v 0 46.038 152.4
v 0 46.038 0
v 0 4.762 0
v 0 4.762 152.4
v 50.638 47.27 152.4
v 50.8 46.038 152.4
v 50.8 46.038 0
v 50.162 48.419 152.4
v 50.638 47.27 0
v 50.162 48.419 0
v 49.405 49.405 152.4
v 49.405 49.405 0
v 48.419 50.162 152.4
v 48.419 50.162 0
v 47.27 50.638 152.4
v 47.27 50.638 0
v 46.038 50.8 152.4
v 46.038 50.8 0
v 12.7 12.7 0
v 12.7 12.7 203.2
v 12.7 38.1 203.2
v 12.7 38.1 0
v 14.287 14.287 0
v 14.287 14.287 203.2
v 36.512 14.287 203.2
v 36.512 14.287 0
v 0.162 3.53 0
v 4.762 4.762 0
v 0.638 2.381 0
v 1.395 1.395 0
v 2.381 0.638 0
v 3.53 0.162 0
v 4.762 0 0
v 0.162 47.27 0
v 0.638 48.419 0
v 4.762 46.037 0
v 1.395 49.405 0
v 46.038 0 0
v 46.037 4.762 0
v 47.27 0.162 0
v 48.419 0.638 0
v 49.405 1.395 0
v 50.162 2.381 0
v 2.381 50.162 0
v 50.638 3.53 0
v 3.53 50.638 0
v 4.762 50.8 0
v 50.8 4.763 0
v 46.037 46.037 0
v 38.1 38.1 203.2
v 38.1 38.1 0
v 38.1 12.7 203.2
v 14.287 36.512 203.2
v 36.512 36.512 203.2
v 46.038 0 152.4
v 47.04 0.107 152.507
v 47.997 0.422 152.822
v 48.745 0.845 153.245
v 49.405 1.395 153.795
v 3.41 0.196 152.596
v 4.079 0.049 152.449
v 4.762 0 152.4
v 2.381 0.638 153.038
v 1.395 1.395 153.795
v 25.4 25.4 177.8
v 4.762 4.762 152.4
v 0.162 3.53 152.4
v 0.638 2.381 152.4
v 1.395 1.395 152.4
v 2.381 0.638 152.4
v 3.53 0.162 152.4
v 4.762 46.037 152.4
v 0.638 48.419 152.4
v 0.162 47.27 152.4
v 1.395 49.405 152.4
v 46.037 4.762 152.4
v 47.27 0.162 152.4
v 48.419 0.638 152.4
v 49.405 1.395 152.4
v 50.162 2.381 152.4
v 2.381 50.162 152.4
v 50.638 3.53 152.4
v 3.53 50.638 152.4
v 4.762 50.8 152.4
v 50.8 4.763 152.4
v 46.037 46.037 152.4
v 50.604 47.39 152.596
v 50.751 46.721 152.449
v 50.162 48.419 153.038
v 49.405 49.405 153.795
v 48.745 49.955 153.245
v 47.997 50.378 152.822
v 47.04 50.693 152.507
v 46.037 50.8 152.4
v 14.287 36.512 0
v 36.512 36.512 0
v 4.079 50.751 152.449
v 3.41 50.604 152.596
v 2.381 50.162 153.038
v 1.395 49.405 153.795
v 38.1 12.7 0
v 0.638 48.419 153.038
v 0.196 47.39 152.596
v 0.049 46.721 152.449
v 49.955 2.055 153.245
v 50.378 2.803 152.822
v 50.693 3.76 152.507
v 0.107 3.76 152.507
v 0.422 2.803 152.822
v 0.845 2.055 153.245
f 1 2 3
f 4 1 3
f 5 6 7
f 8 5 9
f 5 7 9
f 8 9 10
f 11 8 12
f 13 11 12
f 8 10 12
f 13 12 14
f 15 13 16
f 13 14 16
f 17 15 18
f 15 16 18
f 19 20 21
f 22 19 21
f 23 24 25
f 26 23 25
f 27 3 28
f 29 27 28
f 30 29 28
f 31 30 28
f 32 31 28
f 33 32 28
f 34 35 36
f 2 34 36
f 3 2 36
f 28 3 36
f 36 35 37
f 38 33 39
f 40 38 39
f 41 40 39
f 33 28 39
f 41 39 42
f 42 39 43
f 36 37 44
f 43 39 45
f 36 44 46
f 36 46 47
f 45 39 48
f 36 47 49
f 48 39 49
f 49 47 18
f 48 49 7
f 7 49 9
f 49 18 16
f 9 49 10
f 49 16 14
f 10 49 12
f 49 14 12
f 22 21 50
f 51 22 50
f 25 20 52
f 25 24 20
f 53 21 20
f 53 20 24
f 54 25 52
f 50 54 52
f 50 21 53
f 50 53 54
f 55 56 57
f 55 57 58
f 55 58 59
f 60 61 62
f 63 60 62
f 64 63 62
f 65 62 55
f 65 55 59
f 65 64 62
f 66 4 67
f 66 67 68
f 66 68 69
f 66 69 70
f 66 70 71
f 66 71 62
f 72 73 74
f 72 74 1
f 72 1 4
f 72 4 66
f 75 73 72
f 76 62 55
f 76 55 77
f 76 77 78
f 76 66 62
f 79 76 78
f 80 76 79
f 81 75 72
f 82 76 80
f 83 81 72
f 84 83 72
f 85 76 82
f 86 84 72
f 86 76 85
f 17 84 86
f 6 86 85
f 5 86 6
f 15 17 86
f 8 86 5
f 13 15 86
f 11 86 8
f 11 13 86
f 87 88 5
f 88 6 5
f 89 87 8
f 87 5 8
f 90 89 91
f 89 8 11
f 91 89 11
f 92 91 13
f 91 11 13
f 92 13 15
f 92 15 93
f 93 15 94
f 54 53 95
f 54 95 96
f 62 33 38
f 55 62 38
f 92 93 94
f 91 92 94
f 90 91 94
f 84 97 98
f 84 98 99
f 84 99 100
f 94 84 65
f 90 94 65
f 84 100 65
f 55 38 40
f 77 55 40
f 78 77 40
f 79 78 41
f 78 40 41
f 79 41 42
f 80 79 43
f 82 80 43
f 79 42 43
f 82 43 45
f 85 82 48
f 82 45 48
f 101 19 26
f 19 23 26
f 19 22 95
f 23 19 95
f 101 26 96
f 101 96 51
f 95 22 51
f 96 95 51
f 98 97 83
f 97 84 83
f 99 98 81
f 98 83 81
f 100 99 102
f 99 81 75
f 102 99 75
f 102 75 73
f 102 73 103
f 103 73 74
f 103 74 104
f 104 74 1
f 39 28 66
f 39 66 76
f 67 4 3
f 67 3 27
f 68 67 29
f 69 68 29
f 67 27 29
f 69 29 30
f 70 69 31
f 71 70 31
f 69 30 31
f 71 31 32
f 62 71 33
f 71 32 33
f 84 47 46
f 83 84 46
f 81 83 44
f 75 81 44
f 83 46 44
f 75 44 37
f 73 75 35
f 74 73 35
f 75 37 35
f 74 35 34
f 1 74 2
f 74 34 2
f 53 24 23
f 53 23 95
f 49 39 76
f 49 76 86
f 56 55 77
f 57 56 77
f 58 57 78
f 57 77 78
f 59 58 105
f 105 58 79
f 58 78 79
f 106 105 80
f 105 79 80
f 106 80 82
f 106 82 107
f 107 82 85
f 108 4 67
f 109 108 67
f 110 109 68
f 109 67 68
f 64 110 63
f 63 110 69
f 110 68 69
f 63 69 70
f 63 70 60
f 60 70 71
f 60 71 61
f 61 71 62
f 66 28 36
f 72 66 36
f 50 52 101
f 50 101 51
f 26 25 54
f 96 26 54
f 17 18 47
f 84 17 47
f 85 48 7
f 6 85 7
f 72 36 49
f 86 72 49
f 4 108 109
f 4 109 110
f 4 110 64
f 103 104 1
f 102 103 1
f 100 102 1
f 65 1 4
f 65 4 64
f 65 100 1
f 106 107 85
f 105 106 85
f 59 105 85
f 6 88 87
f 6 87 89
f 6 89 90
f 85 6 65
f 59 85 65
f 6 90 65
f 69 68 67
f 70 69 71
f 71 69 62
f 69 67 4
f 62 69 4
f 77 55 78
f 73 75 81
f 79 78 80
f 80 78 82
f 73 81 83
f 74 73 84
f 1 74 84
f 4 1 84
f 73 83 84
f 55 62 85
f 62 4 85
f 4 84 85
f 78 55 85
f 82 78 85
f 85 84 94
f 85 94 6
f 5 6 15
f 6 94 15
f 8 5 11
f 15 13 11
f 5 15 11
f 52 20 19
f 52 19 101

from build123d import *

# Parameters (mm, degrees)
F0_W         = 41.275
F0_H         = 41.275
F1_DEPTH     = 152.4
F3_W         = 41.275
F3_H         = 41.275
F4_DEPTH     = 25.4
F5_T1_DEPTH  = 171.9164957887
F5_T3_DEPTH  = 171.9164957887
F5_T8_ANGLE  = 90
F5_T13_ANGLE = 90
F5_T18_ANGLE = 90
F5_T23_ANGLE = 90
F5_T28_ANGLE = 90
F5_T33_ANGLE = 90
F5_T38_ANGLE = 90
F5_T43_ANGLE = 90
F2_W         = 25.4
F2_H         = 25.4
F2_W_2       = 22.225
F2_H_2       = 22.225
F6_DEPTH     = 203.2


# Not quite as in the source:
# - a fillet or chamfer that OpenCascade refuses, or shapes differently, is made with other operations: its cross-section is extruded or revolved along the edge and cut away or added


with BuildPart() as f1:
    # F0 (on Top) → F1 (new body)
    with BuildSketch(Plane.XY):
        with BuildLine():
            ThreePointArc((0, 4.7625), (1.3949039546, 1.3949039546), (4.7625, 0))
            Line((4.7625, 0), (46.0375, 0))
            ThreePointArc((46.0375, 0), (49.4050960454, 1.3949039546), (50.8, 4.7625))
            Line((50.8, 4.7625), (50.8, 46.0375))
            ThreePointArc((50.8, 46.0375), (49.4050960454, 49.4050960454), (46.0375, 50.8))
            Line((46.0375, 50.8), (4.7625, 50.8))
            ThreePointArc((4.7625, 50.8), (1.3949039546, 49.4050960454), (0, 46.0375))
            Line((0, 46.0375), (0, 4.7625))
        make_face()
        with Locations((25.4, 25.4)):
            Rectangle(F0_W, F0_H, mode=Mode.SUBTRACT)
    extrude(amount=F1_DEPTH)


with BuildPart() as f4:
    # F3 (on face) → F4 (new body)
    with BuildSketch(Plane.XY.offset(152.4)):
        with BuildLine():
            ThreePointArc((0, 4.7625), (1.3949039546, 1.3949039546), (4.7625, 0))
            Line((4.7625, 0), (46.0375, 0))
            ThreePointArc((46.0375, 0), (49.4050960454, 1.3949039546), (50.8, 4.7625))
            Line((50.8, 4.7625), (50.8, 46.0375))
            ThreePointArc((50.8, 46.0375), (49.4050960454, 49.4050960454), (46.0375, 50.8))
            Line((46.0375, 50.8), (4.7625, 50.8))
            ThreePointArc((4.7625, 50.8), (1.3949039546, 49.4050960454), (0, 46.0375))
            Line((0, 46.0375), (0, 4.7625))
        make_face()
        with Locations((25.4, 25.4)):
            Rectangle(F3_W, F3_H, mode=Mode.SUBTRACT)
        with Locations((25.4, 25.4)):
            Rectangle(F3_W, F3_H)
    extrude(amount=F4_DEPTH)

    # F5: chamfer of 25.4 on 4 edges, made by hand

    # F5_s2 → F5_t1 (cut)
    with BuildSketch(Plane.XZ.offset(-111.3582478943)):
        Polygon((50.8, 152.4), (25.4, 177.8), (50.8, 177.8), align=None)
        Polygon((0, 152.4), (25.4, 177.8), (0, 177.8), align=None)
    extrude(amount=F5_T1_DEPTH, mode=Mode.SUBTRACT)

    # F5_s4 → F5_t3 (cut)
    with BuildSketch(Plane.YZ.offset(-60.5582478943)):
        Polygon((50.8, 152.4), (25.4, 177.8), (50.8, 177.8), align=None)
        Polygon((0, 152.4), (25.4, 177.8), (0, 177.8), align=None)
    extrude(amount=F5_T3_DEPTH, mode=Mode.SUBTRACT)


with BuildPart() as f5_tool6:
    # F5_s7 → F5_t8 (revolve)
    with BuildSketch(Plane.YZ.offset(4.7625)):
        Polygon((50.8, 152.4), (46.0375, 157.1625), (46.0375, 177.8), (50.8, 177.8), align=None)
    revolve(axis=Axis((4.7625, 46.0375, 177.8), (0, 0, 1)), revolution_arc=F5_T8_ANGLE)

    split(bisect_by=Plane(origin=(0, 101.6, 101.6), x_dir=(1, 0, 0), z_dir=(0, 0.7071067812, 0.7071067812)), keep=Keep.TOP)


with BuildPart() as f4_1:
    add(f4.part)

    # F5_t5: cut F5_tool6
    add(f5_tool6.part, mode=Mode.SUBTRACT)


with BuildPart() as f5_tool11:
    # F5_s12 → F5_t13 (revolve)
    with BuildSketch(Plane.YZ.offset(4.7625)):
        Polygon((50.8, 152.4), (46.0375, 157.1625), (46.0375, 177.8), (50.8, 177.8), align=None)
    revolve(axis=Axis((4.7625, 46.0375, 177.8), (0, 0, 1)), revolution_arc=F5_T13_ANGLE)

    split(bisect_by=Plane(origin=(-76.2, 0, 76.2), x_dir=(0, 1, 0), z_dir=(-0.7071067812, 0, 0.7071067812)), keep=Keep.TOP)


with BuildPart() as f4_2:
    add(f4_1.part)

    # F5_t10: cut F5_tool11
    add(f5_tool11.part, mode=Mode.SUBTRACT)


with BuildPart() as f5_tool16:
    # F5_s17 → F5_t18 (revolve)
    with BuildSketch(Plane.XZ.offset(-4.7625)):
        Polygon((0, 152.4), (4.7625, 157.1625), (4.7625, 177.8), (0, 177.8), align=None)
    revolve(axis=Axis((4.7625, 4.7625, 177.8), (0, 0, 1)), revolution_arc=F5_T18_ANGLE)

    split(bisect_by=Plane(origin=(-76.2, 0, 76.2), x_dir=(0, 1, 0), z_dir=(-0.7071067812, 0, 0.7071067812)), keep=Keep.TOP)


with BuildPart() as f4_3:
    add(f4_2.part)

    # F5_t15: cut F5_tool16
    add(f5_tool16.part, mode=Mode.SUBTRACT)


with BuildPart() as f5_tool21:
    # F5_s22 → F5_t23 (revolve)
    with BuildSketch(Plane.XZ.offset(-4.7625)):
        Polygon((0, 152.4), (4.7625, 157.1625), (4.7625, 177.8), (0, 177.8), align=None)
    revolve(axis=Axis((4.7625, 4.7625, 177.8), (0, 0, 1)), revolution_arc=F5_T23_ANGLE)

    split(bisect_by=Plane(origin=(0, -76.2, 76.2), x_dir=(1, 0, 0), z_dir=(0, -0.7071067812, 0.7071067812)), keep=Keep.TOP)


with BuildPart() as f4_4:
    add(f4_3.part)

    # F5_t20: cut F5_tool21
    add(f5_tool21.part, mode=Mode.SUBTRACT)


with BuildPart() as f5_tool26:
    # F5_s27 → F5_t28 (revolve)
    with BuildSketch(Plane.YZ.offset(46.0375)):
        Polygon((0, 152.4), (4.7625, 157.1625), (4.7625, 177.8), (0, 177.8), align=None)
    revolve(axis=Axis((46.0375, 4.7625, 177.8), (0, 0, 1)), revolution_arc=F5_T28_ANGLE)

    split(bisect_by=Plane(origin=(0, -76.2, 76.2), x_dir=(1, 0, 0), z_dir=(0, -0.7071067812, 0.7071067812)), keep=Keep.TOP)


with BuildPart() as f4_5:
    add(f4_4.part)

    # F5_t25: cut F5_tool26
    add(f5_tool26.part, mode=Mode.SUBTRACT)


with BuildPart() as f5_tool31:
    # F5_s32 → F5_t33 (revolve)
    with BuildSketch(Plane.YZ.offset(46.0375)):
        Polygon((0, 152.4), (4.7625, 157.1625), (4.7625, 177.8), (0, 177.8), align=None)
    revolve(axis=Axis((46.0375, 4.7625, 177.8), (0, 0, 1)), revolution_arc=F5_T33_ANGLE)

    split(bisect_by=Plane(origin=(101.6, 0, 101.6), x_dir=(0, 1, 0), z_dir=(0.7071067812, 0, 0.7071067812)), keep=Keep.TOP)


with BuildPart() as f4_6:
    add(f4_5.part)

    # F5_t30: cut F5_tool31
    add(f5_tool31.part, mode=Mode.SUBTRACT)


with BuildPart() as f5_tool36:
    # F5_s37 → F5_t38 (revolve)
    with BuildSketch(Plane.XZ.offset(-46.0375)):
        Polygon((50.8, 152.4), (46.0375, 157.1625), (46.0375, 177.8), (50.8, 177.8), align=None)
    revolve(axis=Axis((46.0375, 46.0375, 177.8), (0, 0, 1)), revolution_arc=F5_T38_ANGLE)

    split(bisect_by=Plane(origin=(101.6, 0, 101.6), x_dir=(0, 1, 0), z_dir=(0.7071067812, 0, 0.7071067812)), keep=Keep.TOP)


with BuildPart() as f4_7:
    add(f4_6.part)

    # F5_t35: cut F5_tool36
    add(f5_tool36.part, mode=Mode.SUBTRACT)


with BuildPart() as f5_tool41:
    # F5_s42 → F5_t43 (revolve)
    with BuildSketch(Plane.XZ.offset(-46.0375)):
        Polygon((50.8, 152.4), (46.0375, 157.1625), (46.0375, 177.8), (50.8, 177.8), align=None)
    revolve(axis=Axis((46.0375, 46.0375, 177.8), (0, 0, 1)), revolution_arc=F5_T43_ANGLE)

    split(bisect_by=Plane(origin=(0, 101.6, 101.6), x_dir=(1, 0, 0), z_dir=(0, 0.7071067812, 0.7071067812)), keep=Keep.TOP)


with BuildPart() as f4_8:
    add(f4_7.part)

    # F5_t40: cut F5_tool41
    add(f5_tool41.part, mode=Mode.SUBTRACT)


with BuildPart() as f6:
    # F2 (on Top) → F6 (new body)
    with BuildSketch(Plane.XY):
        with Locations((25.4, 25.4)):
            Rectangle(F2_W, F2_H)
        with Locations((25.4, 25.4)):
            Rectangle(F2_W_2, F2_H_2, mode=Mode.SUBTRACT)
    extrude(amount=F6_DEPTH)


solid = Compound([f1.part, f4_8.part, f6.part])
